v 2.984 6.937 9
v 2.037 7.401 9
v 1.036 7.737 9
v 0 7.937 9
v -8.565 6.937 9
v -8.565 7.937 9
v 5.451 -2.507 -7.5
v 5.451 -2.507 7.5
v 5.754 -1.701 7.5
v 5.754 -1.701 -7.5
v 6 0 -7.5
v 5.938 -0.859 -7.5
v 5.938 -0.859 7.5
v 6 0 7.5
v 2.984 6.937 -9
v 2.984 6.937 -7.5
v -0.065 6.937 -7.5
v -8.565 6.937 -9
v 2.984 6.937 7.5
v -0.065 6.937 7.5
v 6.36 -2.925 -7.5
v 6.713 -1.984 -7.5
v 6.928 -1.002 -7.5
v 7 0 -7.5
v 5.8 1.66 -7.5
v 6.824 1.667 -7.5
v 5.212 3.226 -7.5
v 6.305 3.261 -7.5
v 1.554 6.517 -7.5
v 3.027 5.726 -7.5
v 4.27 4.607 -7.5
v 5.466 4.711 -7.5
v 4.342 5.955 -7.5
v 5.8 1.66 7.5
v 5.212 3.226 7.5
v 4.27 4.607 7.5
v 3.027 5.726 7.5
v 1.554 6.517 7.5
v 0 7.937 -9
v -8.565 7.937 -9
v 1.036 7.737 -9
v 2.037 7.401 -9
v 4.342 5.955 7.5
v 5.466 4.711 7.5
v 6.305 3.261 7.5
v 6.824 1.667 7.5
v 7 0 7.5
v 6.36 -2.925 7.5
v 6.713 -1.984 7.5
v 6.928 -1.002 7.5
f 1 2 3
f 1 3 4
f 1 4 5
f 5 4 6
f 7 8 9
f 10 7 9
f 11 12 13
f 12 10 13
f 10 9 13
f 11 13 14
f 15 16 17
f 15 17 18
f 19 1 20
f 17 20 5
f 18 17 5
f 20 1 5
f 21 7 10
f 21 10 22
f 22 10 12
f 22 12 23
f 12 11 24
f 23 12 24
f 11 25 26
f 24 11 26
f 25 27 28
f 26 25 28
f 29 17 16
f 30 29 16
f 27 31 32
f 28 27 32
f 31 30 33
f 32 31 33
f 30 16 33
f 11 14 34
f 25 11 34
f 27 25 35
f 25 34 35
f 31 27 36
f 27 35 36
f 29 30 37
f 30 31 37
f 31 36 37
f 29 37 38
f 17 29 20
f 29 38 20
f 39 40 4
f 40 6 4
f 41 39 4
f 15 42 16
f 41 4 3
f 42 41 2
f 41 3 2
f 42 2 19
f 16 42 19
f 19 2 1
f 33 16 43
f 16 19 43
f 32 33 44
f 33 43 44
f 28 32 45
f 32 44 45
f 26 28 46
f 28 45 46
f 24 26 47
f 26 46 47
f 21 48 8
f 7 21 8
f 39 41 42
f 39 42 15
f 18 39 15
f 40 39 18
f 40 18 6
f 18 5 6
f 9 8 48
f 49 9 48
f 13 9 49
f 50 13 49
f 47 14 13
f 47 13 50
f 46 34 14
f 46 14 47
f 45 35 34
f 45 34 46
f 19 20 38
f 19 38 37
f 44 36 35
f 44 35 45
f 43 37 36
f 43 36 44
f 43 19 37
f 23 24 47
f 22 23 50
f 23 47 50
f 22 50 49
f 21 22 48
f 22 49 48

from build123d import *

# Parameters (mm, degrees)
BOSS_EXTRUDE1_DEPTH = 9
CUT_EXTRUDE1_DEPTH  = 1.5


with BuildPart() as part:
    # Sketch1 → Boss-Extrude1 (new, symmetric)
    with BuildSketch(Plane.XY):
        with BuildLine():
            Line((-0.064848747, 6.937253933), (-8.564848747, 6.937253933))
            Line((-8.564848747, 6.937253933), (-8.564848747, 7.937253933))
            Line((-8.564848747, 7.937253933), (0, 7.937253933))
            ThreePointArc((0, 7.937253933), (5, 5.291502622), (7, 0))
            ThreePointArc((7, 0), (6.838022738, -1.497145631), (6.359587132, -2.925004532))
            Line((6.359587132, -2.925004532), (5.451074684, -2.507146742))
            ThreePointArc((5.451074684, -2.507146742), (5.861162347, -1.283267683), (6, 0))
            ThreePointArc((6, 0), (4.270012276, 4.607273664), (-0.064848747, 6.937253933))
        make_face()
    extrude(amount=BOSS_EXTRUDE1_DEPTH, both=True)

    # Sketch2 → Cut-Extrude1 (cut)
    with BuildSketch(Plane.XY.offset(9)):
        with BuildLine():
            Line((5.451074684, -2.507146742), (6.359587132, -2.925004532))
            ThreePointArc((6.359587132, -2.925004532), (6.838022738, -1.497145631), (7, 0))
            ThreePointArc((7, 0), (5.923664522, 4.007850993), (2.984282604, 6.937253933))
            Line((2.984282604, 6.937253933), (-0.064848747, 6.937253933))
            ThreePointArc((-0.064848747, 6.937253933), (4.270012276, 4.607273664), (6, 0))
            ThreePointArc((6, 0), (5.861162347, -1.283267683), (5.451074684, -2.507146742))
        make_face()
    cut_extrude1 = extrude(amount=-CUT_EXTRUDE1_DEPTH, mode=Mode.SUBTRACT)

    # Mirror1: Cut-Extrude1 across plane
    add(cut_extrude1.mirror(Plane.XY), mode=Mode.SUBTRACT)


solid = part.part
